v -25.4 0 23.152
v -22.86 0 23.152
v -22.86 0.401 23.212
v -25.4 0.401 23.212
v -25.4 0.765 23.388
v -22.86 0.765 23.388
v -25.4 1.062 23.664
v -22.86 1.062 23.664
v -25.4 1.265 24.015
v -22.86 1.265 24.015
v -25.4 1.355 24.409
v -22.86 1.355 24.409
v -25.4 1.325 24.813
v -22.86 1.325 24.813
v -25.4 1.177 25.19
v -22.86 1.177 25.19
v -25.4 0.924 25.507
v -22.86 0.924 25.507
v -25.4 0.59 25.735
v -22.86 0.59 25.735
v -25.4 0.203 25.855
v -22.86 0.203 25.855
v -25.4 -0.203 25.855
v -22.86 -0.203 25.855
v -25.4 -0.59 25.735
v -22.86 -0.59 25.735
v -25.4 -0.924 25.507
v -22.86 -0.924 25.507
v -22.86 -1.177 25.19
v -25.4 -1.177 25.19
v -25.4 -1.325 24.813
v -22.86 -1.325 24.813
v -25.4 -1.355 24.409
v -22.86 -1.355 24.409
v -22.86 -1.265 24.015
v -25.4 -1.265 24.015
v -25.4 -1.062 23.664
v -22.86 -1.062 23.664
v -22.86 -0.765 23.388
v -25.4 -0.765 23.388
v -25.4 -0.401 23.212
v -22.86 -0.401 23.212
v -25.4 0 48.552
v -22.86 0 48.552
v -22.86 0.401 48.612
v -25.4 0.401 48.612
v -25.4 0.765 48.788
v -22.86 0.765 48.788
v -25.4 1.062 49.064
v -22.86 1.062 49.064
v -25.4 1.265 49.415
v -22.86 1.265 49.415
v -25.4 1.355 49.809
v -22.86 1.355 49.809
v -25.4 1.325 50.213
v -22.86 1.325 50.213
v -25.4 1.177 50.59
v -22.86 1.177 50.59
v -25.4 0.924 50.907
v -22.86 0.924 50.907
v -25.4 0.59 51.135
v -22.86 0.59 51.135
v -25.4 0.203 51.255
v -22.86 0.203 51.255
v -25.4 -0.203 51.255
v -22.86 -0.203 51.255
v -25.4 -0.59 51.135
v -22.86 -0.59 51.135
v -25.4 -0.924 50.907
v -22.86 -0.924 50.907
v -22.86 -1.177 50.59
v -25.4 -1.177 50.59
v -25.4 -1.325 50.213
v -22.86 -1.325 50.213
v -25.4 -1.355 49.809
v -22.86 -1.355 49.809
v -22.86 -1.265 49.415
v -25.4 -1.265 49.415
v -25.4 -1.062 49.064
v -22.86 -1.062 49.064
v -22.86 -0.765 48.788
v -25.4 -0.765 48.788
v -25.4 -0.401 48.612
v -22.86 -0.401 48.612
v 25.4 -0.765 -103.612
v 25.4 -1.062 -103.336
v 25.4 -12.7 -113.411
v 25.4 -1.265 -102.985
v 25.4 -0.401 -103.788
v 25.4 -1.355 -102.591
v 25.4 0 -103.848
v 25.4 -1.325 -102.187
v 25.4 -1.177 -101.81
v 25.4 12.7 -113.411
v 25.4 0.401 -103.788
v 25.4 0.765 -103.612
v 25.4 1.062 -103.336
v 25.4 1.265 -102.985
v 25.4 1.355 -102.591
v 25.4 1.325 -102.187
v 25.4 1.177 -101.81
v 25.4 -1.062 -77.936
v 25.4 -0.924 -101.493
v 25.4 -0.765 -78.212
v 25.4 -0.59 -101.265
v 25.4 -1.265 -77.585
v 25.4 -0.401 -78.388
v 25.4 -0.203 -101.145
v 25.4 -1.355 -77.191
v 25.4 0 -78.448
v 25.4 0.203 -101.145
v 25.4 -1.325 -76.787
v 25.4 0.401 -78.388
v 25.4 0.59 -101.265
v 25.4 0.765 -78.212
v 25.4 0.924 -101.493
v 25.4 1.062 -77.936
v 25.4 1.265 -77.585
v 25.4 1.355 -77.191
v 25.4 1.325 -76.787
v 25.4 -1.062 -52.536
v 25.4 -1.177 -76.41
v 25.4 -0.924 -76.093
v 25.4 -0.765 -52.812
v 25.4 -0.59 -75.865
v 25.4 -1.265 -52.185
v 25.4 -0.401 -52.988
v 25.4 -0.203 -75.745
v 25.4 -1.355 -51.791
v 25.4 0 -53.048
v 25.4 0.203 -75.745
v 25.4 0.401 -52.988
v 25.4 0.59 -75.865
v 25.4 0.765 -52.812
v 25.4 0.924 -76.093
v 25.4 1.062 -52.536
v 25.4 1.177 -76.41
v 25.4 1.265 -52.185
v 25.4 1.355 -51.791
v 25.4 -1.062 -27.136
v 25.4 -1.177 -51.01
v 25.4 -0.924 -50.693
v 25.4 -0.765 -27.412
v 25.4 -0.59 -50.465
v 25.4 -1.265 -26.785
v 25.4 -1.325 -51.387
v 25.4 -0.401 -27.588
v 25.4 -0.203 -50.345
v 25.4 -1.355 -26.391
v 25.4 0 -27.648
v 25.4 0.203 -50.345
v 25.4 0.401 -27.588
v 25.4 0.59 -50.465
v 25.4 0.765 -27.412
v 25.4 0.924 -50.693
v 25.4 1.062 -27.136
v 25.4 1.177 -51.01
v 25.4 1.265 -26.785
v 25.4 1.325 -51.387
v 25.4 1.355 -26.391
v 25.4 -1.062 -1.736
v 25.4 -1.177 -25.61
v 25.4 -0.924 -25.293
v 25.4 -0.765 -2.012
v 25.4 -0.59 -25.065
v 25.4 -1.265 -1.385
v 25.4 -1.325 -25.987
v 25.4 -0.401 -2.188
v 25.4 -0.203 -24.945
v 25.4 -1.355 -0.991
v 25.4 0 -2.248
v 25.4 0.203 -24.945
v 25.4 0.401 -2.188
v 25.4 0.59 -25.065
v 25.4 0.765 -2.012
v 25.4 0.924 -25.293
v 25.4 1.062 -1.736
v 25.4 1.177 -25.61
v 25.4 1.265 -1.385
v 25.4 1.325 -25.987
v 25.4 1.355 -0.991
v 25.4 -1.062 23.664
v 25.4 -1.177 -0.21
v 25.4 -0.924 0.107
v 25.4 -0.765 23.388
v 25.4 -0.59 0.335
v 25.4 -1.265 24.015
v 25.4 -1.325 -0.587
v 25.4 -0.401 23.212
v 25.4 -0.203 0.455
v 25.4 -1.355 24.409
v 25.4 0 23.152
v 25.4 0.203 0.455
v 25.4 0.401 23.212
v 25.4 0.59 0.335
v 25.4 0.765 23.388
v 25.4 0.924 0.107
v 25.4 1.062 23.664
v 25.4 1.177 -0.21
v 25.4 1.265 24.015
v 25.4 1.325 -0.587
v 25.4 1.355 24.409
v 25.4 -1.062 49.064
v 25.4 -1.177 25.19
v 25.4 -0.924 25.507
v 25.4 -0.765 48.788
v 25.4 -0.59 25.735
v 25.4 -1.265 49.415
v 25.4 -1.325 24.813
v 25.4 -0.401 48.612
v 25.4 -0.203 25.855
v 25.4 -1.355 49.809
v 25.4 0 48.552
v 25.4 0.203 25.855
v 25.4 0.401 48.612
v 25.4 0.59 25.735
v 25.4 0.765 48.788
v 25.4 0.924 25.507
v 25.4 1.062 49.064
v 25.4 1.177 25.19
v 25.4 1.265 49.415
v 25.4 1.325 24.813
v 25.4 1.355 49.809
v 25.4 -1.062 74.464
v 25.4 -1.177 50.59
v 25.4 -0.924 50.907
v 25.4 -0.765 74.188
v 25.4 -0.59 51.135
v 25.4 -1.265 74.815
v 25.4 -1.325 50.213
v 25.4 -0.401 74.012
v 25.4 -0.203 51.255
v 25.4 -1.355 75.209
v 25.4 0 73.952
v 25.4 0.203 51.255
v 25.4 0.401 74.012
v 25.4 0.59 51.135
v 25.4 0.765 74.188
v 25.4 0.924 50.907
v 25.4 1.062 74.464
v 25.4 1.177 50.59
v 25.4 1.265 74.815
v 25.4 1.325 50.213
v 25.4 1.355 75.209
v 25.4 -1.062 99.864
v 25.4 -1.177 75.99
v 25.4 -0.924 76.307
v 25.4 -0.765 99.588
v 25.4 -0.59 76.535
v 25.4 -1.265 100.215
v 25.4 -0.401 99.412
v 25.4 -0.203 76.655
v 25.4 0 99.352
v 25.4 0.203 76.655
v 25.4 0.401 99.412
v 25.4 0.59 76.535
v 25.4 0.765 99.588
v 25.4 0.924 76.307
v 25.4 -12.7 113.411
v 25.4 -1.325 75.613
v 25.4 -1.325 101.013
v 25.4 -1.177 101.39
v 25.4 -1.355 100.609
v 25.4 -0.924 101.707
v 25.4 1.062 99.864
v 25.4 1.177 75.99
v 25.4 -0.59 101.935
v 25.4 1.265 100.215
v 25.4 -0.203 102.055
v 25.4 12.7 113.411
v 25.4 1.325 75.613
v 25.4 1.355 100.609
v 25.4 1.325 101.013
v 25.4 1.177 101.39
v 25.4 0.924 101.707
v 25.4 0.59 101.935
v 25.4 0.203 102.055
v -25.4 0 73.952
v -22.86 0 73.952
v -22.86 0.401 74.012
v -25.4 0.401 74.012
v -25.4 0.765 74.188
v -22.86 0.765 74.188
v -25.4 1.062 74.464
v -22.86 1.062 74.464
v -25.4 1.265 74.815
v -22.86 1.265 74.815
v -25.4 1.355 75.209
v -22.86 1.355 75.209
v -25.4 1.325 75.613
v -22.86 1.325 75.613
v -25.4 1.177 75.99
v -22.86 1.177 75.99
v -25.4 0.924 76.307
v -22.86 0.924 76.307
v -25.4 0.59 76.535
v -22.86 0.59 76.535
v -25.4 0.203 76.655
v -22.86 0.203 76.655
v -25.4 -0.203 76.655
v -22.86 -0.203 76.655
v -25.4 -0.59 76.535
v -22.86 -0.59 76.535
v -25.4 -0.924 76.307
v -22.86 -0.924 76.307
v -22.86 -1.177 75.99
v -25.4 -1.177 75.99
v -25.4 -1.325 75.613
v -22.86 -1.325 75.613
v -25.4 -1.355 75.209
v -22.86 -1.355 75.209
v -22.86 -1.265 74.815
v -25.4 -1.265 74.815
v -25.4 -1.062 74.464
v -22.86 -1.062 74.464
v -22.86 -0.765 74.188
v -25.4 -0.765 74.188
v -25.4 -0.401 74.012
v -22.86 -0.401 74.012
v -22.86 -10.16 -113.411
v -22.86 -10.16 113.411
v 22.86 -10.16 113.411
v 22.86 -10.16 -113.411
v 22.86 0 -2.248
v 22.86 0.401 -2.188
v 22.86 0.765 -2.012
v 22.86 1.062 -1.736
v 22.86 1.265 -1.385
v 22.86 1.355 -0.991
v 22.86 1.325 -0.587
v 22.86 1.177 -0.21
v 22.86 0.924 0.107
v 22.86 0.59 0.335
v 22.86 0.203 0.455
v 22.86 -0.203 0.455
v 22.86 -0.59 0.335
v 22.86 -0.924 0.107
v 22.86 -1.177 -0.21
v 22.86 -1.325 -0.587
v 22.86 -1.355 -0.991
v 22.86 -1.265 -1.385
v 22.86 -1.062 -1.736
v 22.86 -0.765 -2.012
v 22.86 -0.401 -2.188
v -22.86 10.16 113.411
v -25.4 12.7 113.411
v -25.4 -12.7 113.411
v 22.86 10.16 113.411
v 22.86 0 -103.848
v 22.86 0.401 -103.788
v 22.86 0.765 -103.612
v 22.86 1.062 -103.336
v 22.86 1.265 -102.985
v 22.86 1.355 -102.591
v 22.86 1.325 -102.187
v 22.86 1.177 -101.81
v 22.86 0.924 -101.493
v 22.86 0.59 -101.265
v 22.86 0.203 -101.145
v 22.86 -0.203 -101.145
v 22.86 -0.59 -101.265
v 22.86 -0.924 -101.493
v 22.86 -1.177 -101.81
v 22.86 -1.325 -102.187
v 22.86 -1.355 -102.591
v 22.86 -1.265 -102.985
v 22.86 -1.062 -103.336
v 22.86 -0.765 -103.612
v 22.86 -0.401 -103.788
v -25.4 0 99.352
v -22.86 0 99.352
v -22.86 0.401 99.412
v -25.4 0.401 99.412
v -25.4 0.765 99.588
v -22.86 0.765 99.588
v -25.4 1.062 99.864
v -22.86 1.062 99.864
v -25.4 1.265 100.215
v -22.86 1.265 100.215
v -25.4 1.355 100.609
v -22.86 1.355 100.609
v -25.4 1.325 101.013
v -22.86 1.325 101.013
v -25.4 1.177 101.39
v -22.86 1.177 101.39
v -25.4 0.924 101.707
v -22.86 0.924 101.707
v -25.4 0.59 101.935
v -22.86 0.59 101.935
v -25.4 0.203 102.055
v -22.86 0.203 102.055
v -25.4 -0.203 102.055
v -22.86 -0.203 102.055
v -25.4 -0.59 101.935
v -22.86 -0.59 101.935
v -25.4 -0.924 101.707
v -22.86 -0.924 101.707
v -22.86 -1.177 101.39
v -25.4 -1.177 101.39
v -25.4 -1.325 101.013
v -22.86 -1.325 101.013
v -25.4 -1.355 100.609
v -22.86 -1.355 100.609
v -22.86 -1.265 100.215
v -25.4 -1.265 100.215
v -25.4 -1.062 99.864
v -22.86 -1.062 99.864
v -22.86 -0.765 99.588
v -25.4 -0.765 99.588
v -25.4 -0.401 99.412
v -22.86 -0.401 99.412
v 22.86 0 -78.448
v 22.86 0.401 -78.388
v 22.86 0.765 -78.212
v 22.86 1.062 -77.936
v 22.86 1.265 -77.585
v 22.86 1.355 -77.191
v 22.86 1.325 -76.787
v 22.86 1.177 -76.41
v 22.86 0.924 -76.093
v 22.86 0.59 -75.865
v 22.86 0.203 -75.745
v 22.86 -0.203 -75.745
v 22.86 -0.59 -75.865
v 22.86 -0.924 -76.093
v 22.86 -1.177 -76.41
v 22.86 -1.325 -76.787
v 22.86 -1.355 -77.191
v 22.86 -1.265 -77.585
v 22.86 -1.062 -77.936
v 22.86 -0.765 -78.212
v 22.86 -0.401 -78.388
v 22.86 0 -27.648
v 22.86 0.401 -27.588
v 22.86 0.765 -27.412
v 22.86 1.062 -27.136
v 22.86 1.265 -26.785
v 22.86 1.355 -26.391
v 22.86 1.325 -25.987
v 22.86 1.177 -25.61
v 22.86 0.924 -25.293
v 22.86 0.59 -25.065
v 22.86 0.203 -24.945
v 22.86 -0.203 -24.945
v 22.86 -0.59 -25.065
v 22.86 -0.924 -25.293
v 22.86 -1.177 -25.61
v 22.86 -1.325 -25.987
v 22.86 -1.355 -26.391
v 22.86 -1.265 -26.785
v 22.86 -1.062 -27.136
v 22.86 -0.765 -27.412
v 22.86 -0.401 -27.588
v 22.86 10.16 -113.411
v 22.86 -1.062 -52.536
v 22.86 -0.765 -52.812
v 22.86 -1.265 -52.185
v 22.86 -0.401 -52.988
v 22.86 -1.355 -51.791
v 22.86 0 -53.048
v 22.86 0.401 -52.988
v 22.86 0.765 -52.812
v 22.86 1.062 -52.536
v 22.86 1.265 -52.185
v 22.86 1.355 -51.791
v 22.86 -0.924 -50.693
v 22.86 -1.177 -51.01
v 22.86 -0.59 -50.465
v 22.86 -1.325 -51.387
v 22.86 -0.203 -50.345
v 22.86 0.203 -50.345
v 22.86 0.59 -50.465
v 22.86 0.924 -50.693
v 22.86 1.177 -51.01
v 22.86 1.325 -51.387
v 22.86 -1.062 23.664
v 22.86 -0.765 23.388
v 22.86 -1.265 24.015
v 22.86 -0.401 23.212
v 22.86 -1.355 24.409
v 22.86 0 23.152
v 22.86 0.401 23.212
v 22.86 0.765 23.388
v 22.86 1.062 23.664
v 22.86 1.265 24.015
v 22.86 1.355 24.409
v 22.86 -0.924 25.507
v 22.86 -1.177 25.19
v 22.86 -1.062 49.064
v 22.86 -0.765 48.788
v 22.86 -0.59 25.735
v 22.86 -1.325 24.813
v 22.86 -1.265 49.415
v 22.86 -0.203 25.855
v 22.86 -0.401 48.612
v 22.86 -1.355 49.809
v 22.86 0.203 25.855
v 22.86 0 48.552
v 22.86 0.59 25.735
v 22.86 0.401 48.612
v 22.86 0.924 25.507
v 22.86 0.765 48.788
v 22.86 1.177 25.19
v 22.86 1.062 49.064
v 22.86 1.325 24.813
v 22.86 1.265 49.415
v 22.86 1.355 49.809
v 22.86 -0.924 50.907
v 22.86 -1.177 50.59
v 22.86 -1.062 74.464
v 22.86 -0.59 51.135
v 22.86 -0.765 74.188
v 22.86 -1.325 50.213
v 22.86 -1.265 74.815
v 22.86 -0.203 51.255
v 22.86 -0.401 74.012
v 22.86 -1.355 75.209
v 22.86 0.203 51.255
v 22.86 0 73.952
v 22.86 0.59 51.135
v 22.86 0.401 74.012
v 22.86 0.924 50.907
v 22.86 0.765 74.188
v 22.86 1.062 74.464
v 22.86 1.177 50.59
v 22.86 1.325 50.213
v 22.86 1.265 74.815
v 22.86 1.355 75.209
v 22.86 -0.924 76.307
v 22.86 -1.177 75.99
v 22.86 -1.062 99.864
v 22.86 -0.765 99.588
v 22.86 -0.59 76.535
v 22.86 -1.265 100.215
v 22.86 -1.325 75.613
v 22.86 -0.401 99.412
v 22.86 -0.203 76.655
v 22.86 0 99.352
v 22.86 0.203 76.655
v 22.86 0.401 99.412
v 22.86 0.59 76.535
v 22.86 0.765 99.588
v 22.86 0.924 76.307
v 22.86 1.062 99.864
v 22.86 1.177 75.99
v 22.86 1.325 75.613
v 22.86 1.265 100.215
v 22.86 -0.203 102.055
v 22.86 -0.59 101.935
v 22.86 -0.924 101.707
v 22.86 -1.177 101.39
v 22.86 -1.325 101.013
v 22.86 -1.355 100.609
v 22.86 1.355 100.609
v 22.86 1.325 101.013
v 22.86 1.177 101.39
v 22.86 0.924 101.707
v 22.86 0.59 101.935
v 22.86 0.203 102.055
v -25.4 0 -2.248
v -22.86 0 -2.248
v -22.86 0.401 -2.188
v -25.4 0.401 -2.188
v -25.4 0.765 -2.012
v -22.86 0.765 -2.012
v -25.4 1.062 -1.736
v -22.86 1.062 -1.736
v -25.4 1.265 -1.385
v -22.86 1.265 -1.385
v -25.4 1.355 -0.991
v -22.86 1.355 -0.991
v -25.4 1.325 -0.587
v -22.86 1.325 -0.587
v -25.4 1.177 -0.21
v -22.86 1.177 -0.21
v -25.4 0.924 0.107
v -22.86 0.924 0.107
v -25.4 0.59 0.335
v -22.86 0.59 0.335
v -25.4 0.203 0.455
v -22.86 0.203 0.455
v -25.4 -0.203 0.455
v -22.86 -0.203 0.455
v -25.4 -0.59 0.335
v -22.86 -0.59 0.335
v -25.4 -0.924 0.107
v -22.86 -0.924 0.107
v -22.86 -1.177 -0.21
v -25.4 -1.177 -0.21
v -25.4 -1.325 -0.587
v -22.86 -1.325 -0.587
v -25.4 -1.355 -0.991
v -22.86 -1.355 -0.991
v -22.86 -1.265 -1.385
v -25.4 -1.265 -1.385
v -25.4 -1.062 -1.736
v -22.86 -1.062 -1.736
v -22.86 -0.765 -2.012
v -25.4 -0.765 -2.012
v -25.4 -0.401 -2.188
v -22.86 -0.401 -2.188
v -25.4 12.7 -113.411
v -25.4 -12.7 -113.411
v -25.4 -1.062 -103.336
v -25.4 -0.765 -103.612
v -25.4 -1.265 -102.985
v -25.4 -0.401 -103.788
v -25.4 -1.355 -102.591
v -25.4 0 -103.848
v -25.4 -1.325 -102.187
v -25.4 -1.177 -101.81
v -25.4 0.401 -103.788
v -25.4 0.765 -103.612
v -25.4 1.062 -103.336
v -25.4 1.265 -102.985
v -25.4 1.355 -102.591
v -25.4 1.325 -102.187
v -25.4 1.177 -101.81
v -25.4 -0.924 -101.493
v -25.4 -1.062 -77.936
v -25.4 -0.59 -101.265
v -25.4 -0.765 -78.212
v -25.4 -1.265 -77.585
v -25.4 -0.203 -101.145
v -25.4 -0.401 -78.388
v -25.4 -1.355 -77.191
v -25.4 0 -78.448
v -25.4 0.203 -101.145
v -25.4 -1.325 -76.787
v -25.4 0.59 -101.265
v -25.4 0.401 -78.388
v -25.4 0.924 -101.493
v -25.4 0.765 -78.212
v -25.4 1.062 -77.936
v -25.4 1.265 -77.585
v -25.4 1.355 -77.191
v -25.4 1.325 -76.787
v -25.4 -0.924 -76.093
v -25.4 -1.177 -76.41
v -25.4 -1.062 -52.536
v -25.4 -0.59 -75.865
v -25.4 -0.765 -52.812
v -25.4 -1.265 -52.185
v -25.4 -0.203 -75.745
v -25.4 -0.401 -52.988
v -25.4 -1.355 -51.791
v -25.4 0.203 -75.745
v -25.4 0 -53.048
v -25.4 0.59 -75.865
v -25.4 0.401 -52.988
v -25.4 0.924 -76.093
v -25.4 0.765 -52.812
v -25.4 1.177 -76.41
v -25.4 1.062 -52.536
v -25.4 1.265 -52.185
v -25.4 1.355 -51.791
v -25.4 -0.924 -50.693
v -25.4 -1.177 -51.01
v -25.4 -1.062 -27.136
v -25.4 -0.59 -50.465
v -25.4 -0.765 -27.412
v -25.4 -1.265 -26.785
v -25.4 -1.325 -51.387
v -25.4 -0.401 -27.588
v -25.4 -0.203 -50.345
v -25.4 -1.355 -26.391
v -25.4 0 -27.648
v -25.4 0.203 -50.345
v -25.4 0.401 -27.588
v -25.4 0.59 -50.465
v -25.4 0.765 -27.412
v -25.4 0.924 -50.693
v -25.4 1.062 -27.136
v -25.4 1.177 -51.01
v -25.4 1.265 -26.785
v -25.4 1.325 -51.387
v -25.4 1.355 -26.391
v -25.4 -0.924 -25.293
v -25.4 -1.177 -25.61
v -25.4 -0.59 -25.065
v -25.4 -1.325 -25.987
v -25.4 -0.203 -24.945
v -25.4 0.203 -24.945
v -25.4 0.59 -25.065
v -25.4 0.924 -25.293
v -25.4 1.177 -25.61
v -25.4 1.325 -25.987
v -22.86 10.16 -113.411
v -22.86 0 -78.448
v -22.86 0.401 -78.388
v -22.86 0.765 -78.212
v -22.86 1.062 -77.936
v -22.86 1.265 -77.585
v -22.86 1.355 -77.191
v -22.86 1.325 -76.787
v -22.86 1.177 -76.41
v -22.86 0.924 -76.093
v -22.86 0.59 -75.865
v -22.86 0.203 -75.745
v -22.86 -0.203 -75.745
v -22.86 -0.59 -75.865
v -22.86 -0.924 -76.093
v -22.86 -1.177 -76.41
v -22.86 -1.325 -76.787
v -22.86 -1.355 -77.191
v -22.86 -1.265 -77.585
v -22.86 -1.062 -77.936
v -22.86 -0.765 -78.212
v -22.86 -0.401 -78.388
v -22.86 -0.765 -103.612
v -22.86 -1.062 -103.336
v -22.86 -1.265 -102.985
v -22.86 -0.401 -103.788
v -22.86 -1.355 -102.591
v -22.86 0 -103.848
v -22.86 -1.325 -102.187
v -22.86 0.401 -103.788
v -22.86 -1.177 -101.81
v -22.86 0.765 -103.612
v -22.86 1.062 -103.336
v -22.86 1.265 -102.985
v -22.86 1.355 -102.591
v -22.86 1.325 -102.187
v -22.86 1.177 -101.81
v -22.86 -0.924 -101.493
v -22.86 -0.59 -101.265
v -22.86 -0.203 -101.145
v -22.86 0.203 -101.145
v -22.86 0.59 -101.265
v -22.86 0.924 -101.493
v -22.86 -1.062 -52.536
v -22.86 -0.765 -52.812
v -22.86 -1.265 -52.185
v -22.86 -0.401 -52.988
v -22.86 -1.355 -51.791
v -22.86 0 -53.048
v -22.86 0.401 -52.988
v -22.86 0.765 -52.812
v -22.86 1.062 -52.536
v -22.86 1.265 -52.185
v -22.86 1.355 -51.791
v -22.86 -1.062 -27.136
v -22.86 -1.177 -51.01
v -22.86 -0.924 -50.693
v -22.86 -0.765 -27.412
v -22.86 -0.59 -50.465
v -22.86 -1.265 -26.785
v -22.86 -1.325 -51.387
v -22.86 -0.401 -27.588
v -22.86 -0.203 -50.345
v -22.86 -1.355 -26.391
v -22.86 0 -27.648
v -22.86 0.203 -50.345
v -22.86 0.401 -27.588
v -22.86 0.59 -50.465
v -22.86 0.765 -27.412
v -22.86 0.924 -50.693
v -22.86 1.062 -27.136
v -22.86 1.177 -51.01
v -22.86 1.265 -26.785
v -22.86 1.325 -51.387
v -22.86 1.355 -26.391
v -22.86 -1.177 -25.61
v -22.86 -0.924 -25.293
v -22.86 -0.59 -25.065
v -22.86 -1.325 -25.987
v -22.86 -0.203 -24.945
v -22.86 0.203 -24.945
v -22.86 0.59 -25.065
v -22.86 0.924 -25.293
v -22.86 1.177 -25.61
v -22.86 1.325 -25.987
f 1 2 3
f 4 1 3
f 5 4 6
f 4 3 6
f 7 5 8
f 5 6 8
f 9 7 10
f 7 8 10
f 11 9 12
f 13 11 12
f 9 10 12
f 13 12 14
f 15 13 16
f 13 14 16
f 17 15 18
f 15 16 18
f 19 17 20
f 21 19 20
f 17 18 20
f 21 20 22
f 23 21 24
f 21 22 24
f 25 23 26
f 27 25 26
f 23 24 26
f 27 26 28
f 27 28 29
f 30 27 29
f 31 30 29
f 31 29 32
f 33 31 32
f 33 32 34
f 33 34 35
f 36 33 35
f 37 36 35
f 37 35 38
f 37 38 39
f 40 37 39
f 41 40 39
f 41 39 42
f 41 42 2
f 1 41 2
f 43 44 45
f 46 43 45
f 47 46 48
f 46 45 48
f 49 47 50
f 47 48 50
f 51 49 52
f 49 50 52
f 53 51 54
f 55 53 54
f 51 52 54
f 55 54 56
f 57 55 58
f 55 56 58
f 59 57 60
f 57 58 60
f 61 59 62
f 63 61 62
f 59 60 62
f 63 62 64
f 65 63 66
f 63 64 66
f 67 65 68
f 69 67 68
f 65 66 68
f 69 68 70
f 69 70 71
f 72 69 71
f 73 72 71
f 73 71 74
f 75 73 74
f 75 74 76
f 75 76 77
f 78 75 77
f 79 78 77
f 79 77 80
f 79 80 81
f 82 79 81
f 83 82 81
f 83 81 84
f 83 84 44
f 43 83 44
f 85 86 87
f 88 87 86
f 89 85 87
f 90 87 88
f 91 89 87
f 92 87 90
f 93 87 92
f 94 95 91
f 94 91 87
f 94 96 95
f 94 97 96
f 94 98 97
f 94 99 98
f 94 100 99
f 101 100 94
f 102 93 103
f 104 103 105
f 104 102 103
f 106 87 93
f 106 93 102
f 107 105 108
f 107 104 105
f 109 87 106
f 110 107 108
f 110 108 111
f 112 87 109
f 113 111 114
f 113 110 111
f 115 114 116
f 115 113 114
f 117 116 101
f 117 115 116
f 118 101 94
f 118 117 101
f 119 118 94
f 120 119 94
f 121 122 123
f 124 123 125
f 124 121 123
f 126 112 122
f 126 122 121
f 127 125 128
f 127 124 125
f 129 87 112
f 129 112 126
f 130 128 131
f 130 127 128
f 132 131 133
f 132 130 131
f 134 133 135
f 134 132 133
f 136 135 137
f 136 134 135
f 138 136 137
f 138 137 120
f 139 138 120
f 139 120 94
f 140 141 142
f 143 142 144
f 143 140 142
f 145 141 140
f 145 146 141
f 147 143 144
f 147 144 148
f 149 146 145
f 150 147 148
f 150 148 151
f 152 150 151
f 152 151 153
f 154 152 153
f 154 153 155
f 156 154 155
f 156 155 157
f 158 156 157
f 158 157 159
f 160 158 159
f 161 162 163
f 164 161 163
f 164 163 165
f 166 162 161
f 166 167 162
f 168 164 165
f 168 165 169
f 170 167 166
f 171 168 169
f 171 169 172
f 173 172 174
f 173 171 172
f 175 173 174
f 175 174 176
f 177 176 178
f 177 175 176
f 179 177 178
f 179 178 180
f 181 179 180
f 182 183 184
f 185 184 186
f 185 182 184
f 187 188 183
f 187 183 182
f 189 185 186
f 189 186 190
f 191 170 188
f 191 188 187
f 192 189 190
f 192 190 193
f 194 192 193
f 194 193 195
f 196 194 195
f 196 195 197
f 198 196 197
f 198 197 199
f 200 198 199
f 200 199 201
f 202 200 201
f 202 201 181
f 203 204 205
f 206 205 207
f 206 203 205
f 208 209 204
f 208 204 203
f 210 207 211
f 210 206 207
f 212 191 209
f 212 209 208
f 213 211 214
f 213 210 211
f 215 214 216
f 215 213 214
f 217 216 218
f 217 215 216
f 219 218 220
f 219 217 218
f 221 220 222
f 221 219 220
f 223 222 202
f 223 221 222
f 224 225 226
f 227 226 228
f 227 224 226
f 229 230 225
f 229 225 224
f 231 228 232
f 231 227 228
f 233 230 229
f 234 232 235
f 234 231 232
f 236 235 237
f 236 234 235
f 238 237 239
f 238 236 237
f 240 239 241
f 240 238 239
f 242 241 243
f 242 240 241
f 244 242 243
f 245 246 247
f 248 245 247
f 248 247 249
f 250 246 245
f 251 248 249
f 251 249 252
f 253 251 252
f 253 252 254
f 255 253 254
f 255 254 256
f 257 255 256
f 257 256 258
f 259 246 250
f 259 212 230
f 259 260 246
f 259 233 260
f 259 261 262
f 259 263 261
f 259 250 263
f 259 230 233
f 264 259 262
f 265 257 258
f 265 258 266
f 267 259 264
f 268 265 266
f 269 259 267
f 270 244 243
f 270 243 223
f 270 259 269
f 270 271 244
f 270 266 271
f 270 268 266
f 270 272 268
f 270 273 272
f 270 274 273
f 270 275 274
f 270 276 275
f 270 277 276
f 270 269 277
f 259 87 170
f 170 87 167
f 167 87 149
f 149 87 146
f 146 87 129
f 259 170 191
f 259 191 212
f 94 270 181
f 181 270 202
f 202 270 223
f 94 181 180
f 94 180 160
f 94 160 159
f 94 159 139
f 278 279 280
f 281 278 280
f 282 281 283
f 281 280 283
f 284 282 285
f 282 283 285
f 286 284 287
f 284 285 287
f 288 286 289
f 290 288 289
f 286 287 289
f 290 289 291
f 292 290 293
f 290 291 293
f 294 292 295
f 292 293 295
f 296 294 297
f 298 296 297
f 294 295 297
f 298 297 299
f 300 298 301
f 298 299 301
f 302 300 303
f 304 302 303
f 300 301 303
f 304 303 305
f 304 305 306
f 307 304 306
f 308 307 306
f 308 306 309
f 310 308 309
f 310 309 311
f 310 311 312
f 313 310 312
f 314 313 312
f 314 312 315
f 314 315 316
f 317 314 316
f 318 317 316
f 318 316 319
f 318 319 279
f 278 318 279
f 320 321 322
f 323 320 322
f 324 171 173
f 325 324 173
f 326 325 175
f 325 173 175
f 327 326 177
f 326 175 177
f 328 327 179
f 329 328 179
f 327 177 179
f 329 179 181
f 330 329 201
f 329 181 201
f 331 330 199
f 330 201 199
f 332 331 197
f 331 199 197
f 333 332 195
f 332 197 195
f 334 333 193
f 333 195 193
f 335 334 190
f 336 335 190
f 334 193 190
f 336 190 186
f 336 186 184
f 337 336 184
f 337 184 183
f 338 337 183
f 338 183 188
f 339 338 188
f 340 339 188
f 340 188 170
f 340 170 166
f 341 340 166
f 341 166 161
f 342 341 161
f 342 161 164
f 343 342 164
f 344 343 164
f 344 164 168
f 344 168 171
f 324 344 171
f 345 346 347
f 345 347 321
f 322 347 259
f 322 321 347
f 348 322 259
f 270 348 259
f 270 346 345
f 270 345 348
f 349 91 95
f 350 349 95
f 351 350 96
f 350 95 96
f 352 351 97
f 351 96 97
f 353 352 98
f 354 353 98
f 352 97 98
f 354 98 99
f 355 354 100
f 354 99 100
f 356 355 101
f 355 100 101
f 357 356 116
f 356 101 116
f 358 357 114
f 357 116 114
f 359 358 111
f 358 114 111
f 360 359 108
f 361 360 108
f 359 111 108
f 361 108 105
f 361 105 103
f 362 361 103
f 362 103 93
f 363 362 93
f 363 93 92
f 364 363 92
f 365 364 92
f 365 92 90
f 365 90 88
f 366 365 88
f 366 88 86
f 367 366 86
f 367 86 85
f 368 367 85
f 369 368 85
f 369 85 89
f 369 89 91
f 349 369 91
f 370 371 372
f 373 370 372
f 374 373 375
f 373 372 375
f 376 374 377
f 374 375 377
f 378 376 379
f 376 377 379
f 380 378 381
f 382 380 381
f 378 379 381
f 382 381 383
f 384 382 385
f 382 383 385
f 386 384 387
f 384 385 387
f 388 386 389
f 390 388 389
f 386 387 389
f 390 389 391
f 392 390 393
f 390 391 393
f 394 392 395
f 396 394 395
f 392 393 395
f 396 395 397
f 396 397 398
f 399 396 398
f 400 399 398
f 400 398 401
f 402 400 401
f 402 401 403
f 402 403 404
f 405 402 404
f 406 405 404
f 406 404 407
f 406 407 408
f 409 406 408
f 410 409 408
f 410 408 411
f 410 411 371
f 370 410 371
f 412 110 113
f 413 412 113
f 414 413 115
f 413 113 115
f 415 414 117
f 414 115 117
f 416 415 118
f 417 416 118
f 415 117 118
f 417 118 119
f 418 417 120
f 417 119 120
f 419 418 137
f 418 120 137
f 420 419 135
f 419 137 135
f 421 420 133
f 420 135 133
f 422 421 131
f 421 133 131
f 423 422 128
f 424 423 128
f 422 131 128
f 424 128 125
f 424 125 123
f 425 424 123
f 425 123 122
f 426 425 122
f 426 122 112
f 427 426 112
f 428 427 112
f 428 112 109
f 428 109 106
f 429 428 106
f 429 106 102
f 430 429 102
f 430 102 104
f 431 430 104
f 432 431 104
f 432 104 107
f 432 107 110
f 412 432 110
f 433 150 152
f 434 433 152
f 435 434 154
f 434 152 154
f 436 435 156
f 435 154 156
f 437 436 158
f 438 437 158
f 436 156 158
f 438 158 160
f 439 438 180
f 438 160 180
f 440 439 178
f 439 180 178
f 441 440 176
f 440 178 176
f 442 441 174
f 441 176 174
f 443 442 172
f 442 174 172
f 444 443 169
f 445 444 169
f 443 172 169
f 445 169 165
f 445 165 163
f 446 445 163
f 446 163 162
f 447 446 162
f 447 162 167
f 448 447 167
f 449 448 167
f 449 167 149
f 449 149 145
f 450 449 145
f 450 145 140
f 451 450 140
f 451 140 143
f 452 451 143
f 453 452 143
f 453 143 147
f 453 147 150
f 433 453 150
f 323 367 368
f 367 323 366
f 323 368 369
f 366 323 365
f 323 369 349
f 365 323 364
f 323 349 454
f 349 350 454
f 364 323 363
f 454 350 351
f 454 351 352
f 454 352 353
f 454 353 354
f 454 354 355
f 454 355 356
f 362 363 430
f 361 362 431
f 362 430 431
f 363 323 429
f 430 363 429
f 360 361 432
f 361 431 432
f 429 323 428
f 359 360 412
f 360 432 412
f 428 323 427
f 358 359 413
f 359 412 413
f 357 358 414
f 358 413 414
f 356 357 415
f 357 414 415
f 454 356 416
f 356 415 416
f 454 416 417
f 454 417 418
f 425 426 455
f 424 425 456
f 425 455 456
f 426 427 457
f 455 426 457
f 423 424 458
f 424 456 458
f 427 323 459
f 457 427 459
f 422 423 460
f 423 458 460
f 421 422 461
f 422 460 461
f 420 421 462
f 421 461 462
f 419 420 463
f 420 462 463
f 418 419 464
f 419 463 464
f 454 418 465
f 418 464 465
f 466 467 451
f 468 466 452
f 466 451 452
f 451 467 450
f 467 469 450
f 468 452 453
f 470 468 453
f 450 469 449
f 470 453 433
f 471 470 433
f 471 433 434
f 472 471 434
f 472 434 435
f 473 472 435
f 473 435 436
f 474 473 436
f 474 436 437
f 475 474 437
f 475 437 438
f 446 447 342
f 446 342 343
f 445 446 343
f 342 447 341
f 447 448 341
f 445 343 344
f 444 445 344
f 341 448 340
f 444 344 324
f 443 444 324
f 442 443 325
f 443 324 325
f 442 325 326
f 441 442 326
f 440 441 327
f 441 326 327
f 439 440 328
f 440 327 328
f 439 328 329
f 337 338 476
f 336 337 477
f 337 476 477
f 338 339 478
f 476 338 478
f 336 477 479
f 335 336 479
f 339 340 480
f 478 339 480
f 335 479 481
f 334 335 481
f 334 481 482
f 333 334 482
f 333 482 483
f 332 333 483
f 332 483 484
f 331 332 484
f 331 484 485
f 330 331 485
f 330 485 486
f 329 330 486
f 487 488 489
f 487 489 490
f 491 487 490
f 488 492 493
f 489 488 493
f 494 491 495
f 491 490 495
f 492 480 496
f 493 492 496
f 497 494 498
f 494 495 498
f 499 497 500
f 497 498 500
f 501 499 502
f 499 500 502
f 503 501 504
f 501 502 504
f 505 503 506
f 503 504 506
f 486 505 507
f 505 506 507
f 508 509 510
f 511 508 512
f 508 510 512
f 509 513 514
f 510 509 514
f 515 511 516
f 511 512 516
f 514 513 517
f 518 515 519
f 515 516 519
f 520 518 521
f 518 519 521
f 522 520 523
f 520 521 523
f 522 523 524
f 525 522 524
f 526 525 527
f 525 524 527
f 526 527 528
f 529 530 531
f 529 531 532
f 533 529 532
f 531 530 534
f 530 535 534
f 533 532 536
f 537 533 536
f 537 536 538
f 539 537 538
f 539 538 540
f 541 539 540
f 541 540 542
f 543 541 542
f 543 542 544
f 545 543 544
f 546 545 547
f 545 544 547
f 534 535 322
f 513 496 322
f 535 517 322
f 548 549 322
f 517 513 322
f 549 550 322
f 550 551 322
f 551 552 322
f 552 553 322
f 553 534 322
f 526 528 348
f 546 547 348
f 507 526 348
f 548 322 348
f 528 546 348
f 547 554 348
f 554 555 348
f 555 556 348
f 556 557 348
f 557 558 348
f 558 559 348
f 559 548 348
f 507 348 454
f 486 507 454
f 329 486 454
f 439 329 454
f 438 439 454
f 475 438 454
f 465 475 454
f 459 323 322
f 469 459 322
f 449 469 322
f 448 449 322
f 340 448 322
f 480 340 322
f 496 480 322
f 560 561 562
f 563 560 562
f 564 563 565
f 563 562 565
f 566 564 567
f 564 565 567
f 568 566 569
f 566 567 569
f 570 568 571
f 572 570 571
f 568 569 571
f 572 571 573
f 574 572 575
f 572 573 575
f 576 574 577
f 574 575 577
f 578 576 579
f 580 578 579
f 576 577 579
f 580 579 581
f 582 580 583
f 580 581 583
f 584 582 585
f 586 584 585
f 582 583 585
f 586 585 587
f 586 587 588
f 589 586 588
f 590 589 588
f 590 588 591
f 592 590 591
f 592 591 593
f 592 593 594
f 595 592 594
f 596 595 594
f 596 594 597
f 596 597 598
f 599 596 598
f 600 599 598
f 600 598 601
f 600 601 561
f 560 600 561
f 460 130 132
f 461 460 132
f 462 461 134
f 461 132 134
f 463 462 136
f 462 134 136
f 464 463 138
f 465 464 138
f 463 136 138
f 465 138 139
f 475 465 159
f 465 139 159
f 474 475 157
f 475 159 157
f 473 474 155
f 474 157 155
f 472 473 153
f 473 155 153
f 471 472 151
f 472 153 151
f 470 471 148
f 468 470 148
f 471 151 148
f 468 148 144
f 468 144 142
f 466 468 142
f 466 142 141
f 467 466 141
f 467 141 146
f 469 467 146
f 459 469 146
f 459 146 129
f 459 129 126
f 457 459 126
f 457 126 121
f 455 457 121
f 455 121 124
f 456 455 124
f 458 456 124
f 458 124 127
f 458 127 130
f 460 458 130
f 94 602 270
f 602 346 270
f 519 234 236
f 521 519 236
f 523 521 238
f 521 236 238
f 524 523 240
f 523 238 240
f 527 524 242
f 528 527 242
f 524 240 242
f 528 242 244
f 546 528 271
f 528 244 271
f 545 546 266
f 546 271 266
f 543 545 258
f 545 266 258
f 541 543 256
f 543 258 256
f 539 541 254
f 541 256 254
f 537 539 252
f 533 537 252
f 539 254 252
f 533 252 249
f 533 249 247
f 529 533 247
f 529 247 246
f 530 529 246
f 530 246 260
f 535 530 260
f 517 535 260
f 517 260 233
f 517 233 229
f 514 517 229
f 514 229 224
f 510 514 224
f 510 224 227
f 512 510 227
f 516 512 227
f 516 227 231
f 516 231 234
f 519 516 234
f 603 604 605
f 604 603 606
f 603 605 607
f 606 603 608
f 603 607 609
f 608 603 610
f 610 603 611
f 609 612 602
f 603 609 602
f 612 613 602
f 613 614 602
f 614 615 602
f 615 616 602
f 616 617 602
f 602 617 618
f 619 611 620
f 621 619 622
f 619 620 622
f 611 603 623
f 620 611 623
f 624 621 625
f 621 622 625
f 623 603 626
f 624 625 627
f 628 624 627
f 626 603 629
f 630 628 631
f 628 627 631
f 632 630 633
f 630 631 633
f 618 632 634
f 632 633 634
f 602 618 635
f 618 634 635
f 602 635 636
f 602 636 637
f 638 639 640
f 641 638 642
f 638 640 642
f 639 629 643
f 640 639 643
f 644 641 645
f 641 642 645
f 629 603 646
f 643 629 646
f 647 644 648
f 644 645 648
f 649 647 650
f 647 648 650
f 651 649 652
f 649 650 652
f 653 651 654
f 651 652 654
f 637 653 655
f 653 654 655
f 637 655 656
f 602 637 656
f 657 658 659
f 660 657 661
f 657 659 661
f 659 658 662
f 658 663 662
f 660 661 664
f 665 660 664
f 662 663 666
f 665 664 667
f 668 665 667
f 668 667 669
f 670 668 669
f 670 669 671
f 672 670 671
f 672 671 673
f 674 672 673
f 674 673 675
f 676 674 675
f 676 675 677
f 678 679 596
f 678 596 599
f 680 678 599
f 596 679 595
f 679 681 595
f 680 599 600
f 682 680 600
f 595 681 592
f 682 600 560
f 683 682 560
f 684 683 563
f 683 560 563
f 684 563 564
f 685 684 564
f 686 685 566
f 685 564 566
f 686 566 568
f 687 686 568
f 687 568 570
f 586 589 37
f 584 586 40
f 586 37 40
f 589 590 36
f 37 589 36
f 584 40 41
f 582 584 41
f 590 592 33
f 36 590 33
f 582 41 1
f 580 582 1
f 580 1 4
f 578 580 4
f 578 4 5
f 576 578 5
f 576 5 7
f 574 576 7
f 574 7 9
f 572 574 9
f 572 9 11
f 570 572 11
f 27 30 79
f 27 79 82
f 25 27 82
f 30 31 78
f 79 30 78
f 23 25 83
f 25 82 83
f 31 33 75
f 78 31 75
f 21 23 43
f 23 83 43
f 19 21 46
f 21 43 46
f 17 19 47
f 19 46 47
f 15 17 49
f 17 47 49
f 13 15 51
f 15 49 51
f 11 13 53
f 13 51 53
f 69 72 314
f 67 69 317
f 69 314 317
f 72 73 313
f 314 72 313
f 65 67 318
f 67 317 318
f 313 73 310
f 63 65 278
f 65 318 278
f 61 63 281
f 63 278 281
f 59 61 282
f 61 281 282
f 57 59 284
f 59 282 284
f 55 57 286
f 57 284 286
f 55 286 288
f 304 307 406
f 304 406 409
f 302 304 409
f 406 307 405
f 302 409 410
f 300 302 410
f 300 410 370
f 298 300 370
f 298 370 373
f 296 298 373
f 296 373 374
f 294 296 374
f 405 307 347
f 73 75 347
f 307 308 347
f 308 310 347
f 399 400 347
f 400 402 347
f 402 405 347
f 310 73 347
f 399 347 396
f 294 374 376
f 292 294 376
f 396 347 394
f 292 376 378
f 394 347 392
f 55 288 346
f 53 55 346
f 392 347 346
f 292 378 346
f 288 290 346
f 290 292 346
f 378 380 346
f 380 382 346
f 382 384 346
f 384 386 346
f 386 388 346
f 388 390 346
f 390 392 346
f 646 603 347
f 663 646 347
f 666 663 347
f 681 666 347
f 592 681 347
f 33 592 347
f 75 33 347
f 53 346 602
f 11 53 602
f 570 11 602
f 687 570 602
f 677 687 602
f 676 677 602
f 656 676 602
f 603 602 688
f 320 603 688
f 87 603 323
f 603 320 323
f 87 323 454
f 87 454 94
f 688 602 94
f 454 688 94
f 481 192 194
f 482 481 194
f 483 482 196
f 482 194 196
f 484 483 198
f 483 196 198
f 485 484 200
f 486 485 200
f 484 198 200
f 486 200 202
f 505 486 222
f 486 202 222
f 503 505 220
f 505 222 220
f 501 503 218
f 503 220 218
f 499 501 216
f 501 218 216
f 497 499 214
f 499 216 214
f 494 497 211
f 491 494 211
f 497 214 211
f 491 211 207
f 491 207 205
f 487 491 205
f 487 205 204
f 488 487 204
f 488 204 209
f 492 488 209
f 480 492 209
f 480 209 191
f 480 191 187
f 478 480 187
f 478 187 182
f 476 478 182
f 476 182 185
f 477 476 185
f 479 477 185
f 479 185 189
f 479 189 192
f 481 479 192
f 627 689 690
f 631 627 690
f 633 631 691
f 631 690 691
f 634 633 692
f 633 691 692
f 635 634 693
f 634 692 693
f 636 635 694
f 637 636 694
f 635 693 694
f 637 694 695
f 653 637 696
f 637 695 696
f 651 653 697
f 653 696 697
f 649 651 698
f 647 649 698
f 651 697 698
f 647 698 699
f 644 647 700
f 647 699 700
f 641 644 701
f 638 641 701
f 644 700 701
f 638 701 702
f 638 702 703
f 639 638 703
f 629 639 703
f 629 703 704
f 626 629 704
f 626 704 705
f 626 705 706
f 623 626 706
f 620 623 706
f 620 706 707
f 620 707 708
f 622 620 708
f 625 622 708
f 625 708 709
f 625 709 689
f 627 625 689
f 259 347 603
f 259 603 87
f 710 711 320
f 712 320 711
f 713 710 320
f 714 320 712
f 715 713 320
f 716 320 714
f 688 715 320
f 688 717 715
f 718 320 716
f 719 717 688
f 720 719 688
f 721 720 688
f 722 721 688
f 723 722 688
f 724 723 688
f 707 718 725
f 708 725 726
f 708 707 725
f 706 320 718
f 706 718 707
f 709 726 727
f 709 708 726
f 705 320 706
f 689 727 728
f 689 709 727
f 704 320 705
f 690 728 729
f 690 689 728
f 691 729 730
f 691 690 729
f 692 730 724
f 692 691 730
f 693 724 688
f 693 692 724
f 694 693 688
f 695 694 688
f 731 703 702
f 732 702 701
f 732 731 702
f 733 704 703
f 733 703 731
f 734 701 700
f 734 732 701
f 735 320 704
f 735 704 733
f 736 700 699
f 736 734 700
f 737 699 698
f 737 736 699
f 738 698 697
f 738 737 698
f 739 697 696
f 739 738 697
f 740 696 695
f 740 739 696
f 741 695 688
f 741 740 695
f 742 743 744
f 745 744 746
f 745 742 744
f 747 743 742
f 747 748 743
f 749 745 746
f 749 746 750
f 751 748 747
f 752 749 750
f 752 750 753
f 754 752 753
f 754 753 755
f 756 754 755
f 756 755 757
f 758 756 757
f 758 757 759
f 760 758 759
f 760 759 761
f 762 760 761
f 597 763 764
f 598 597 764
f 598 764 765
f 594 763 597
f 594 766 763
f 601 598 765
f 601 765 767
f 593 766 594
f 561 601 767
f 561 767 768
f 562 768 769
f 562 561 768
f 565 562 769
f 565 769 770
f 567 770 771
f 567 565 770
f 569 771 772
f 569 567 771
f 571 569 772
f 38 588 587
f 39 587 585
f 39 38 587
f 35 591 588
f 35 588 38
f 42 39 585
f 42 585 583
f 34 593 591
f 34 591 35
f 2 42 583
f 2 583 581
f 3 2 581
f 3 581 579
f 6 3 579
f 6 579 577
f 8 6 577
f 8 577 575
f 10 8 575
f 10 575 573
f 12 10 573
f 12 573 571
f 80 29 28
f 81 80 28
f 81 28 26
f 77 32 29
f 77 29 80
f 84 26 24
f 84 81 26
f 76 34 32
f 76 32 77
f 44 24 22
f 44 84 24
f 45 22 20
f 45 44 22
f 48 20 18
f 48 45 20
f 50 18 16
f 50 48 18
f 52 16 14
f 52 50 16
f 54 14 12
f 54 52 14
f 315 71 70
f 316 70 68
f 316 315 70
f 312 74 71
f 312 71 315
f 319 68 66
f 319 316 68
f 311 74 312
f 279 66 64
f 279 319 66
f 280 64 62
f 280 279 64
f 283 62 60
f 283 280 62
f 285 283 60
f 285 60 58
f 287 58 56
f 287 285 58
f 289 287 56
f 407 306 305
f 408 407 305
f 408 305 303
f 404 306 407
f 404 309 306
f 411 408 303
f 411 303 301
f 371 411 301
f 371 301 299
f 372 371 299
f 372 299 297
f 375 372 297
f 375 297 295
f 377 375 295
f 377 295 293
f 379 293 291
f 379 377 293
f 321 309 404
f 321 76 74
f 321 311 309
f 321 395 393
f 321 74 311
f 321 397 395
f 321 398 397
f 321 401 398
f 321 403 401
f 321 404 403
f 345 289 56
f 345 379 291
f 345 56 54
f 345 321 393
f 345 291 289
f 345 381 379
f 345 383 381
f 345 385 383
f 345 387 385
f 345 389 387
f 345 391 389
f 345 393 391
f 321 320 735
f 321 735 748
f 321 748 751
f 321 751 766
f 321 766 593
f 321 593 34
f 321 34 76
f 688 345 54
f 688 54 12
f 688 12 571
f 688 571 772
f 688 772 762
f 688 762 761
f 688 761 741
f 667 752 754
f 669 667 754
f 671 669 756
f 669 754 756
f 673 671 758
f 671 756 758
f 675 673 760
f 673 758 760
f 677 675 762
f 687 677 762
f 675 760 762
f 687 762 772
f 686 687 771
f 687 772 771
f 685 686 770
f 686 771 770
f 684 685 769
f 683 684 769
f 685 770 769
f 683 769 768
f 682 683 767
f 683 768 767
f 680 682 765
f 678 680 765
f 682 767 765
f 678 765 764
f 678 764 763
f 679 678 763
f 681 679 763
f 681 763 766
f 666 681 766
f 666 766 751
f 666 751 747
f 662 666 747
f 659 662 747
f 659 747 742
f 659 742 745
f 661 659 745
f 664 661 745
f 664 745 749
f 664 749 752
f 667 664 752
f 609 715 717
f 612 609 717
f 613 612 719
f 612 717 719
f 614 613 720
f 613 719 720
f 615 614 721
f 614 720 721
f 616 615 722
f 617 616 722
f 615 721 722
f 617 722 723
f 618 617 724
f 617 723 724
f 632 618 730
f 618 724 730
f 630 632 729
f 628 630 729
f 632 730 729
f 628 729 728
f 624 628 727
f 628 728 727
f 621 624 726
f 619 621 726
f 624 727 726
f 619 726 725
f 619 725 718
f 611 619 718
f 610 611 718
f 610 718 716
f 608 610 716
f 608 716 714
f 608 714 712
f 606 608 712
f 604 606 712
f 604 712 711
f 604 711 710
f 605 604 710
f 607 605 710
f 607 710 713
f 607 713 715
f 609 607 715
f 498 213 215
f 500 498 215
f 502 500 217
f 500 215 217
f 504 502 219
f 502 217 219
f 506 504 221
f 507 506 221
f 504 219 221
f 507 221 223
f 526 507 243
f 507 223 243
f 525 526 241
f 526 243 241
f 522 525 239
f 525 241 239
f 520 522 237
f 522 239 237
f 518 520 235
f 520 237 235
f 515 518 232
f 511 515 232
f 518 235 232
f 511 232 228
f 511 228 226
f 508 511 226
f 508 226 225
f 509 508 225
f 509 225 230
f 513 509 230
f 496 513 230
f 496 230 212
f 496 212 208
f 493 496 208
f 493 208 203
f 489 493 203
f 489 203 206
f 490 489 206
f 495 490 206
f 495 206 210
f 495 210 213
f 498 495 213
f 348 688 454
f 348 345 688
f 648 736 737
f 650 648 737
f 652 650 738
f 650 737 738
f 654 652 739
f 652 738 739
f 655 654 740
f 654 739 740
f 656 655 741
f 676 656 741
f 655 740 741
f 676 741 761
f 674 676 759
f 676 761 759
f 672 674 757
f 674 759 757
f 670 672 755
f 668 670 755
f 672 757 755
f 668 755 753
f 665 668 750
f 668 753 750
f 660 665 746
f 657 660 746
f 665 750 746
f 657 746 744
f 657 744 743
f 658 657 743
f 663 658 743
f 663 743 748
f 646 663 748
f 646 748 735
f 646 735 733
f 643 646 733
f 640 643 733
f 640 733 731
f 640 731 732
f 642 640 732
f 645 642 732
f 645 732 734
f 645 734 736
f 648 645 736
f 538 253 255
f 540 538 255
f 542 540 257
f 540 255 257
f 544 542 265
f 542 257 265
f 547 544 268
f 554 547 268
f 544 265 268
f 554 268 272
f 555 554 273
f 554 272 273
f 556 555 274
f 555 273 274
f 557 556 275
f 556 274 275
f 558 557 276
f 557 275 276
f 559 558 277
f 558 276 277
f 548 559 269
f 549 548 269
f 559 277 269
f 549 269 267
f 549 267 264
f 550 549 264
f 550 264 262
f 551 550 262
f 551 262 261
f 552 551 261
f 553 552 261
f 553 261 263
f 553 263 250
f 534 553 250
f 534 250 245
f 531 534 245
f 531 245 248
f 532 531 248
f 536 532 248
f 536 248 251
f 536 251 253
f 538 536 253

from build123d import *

# Parameters (mm, degrees)
SKETCH1_W           = 50.8
SKETCH1_H           = 25.4
SKETCH1_W_2         = 45.72
SKETCH1_H_2         = 20.32
EXTRUDE_THIN1_DEPTH = 113.411
SKETCH2_R           = 1.3589
CUT_EXTRUDE1_DEPTH  = 51.8
LPATTERN1_COUNT     = 9
LPATTERN1_PITCH     = 25.4


with BuildPart() as part:
    # Sketch1 → Extrude-Thin1 (new body, symmetric)
    with BuildSketch(Plane.XY):
        Rectangle(SKETCH1_W, SKETCH1_H)
        Rectangle(SKETCH1_W_2, SKETCH1_H_2, mode=Mode.SUBTRACT)
    extrude(amount=EXTRUDE_THIN1_DEPTH, both=True)

    # Sketch2 → Cut-Extrude1 (cut, through all)
    with BuildSketch(Plane(origin=(25.4, 0, 0), x_dir=(0, 0, -1), z_dir=(1, 0, 0))):
        with Locations((-100.711, 0)):
            Circle(SKETCH2_R)
    cut_extrude1 = extrude(amount=-CUT_EXTRUDE1_DEPTH, mode=Mode.SUBTRACT)

    # LPattern1: Cut-Extrude1 ×9
    with Locations(*[(0, 0, -i * LPATTERN1_PITCH) for i in range(1, LPATTERN1_COUNT)]):
        add(cut_extrude1, mode=Mode.SUBTRACT)


solid = part.part
